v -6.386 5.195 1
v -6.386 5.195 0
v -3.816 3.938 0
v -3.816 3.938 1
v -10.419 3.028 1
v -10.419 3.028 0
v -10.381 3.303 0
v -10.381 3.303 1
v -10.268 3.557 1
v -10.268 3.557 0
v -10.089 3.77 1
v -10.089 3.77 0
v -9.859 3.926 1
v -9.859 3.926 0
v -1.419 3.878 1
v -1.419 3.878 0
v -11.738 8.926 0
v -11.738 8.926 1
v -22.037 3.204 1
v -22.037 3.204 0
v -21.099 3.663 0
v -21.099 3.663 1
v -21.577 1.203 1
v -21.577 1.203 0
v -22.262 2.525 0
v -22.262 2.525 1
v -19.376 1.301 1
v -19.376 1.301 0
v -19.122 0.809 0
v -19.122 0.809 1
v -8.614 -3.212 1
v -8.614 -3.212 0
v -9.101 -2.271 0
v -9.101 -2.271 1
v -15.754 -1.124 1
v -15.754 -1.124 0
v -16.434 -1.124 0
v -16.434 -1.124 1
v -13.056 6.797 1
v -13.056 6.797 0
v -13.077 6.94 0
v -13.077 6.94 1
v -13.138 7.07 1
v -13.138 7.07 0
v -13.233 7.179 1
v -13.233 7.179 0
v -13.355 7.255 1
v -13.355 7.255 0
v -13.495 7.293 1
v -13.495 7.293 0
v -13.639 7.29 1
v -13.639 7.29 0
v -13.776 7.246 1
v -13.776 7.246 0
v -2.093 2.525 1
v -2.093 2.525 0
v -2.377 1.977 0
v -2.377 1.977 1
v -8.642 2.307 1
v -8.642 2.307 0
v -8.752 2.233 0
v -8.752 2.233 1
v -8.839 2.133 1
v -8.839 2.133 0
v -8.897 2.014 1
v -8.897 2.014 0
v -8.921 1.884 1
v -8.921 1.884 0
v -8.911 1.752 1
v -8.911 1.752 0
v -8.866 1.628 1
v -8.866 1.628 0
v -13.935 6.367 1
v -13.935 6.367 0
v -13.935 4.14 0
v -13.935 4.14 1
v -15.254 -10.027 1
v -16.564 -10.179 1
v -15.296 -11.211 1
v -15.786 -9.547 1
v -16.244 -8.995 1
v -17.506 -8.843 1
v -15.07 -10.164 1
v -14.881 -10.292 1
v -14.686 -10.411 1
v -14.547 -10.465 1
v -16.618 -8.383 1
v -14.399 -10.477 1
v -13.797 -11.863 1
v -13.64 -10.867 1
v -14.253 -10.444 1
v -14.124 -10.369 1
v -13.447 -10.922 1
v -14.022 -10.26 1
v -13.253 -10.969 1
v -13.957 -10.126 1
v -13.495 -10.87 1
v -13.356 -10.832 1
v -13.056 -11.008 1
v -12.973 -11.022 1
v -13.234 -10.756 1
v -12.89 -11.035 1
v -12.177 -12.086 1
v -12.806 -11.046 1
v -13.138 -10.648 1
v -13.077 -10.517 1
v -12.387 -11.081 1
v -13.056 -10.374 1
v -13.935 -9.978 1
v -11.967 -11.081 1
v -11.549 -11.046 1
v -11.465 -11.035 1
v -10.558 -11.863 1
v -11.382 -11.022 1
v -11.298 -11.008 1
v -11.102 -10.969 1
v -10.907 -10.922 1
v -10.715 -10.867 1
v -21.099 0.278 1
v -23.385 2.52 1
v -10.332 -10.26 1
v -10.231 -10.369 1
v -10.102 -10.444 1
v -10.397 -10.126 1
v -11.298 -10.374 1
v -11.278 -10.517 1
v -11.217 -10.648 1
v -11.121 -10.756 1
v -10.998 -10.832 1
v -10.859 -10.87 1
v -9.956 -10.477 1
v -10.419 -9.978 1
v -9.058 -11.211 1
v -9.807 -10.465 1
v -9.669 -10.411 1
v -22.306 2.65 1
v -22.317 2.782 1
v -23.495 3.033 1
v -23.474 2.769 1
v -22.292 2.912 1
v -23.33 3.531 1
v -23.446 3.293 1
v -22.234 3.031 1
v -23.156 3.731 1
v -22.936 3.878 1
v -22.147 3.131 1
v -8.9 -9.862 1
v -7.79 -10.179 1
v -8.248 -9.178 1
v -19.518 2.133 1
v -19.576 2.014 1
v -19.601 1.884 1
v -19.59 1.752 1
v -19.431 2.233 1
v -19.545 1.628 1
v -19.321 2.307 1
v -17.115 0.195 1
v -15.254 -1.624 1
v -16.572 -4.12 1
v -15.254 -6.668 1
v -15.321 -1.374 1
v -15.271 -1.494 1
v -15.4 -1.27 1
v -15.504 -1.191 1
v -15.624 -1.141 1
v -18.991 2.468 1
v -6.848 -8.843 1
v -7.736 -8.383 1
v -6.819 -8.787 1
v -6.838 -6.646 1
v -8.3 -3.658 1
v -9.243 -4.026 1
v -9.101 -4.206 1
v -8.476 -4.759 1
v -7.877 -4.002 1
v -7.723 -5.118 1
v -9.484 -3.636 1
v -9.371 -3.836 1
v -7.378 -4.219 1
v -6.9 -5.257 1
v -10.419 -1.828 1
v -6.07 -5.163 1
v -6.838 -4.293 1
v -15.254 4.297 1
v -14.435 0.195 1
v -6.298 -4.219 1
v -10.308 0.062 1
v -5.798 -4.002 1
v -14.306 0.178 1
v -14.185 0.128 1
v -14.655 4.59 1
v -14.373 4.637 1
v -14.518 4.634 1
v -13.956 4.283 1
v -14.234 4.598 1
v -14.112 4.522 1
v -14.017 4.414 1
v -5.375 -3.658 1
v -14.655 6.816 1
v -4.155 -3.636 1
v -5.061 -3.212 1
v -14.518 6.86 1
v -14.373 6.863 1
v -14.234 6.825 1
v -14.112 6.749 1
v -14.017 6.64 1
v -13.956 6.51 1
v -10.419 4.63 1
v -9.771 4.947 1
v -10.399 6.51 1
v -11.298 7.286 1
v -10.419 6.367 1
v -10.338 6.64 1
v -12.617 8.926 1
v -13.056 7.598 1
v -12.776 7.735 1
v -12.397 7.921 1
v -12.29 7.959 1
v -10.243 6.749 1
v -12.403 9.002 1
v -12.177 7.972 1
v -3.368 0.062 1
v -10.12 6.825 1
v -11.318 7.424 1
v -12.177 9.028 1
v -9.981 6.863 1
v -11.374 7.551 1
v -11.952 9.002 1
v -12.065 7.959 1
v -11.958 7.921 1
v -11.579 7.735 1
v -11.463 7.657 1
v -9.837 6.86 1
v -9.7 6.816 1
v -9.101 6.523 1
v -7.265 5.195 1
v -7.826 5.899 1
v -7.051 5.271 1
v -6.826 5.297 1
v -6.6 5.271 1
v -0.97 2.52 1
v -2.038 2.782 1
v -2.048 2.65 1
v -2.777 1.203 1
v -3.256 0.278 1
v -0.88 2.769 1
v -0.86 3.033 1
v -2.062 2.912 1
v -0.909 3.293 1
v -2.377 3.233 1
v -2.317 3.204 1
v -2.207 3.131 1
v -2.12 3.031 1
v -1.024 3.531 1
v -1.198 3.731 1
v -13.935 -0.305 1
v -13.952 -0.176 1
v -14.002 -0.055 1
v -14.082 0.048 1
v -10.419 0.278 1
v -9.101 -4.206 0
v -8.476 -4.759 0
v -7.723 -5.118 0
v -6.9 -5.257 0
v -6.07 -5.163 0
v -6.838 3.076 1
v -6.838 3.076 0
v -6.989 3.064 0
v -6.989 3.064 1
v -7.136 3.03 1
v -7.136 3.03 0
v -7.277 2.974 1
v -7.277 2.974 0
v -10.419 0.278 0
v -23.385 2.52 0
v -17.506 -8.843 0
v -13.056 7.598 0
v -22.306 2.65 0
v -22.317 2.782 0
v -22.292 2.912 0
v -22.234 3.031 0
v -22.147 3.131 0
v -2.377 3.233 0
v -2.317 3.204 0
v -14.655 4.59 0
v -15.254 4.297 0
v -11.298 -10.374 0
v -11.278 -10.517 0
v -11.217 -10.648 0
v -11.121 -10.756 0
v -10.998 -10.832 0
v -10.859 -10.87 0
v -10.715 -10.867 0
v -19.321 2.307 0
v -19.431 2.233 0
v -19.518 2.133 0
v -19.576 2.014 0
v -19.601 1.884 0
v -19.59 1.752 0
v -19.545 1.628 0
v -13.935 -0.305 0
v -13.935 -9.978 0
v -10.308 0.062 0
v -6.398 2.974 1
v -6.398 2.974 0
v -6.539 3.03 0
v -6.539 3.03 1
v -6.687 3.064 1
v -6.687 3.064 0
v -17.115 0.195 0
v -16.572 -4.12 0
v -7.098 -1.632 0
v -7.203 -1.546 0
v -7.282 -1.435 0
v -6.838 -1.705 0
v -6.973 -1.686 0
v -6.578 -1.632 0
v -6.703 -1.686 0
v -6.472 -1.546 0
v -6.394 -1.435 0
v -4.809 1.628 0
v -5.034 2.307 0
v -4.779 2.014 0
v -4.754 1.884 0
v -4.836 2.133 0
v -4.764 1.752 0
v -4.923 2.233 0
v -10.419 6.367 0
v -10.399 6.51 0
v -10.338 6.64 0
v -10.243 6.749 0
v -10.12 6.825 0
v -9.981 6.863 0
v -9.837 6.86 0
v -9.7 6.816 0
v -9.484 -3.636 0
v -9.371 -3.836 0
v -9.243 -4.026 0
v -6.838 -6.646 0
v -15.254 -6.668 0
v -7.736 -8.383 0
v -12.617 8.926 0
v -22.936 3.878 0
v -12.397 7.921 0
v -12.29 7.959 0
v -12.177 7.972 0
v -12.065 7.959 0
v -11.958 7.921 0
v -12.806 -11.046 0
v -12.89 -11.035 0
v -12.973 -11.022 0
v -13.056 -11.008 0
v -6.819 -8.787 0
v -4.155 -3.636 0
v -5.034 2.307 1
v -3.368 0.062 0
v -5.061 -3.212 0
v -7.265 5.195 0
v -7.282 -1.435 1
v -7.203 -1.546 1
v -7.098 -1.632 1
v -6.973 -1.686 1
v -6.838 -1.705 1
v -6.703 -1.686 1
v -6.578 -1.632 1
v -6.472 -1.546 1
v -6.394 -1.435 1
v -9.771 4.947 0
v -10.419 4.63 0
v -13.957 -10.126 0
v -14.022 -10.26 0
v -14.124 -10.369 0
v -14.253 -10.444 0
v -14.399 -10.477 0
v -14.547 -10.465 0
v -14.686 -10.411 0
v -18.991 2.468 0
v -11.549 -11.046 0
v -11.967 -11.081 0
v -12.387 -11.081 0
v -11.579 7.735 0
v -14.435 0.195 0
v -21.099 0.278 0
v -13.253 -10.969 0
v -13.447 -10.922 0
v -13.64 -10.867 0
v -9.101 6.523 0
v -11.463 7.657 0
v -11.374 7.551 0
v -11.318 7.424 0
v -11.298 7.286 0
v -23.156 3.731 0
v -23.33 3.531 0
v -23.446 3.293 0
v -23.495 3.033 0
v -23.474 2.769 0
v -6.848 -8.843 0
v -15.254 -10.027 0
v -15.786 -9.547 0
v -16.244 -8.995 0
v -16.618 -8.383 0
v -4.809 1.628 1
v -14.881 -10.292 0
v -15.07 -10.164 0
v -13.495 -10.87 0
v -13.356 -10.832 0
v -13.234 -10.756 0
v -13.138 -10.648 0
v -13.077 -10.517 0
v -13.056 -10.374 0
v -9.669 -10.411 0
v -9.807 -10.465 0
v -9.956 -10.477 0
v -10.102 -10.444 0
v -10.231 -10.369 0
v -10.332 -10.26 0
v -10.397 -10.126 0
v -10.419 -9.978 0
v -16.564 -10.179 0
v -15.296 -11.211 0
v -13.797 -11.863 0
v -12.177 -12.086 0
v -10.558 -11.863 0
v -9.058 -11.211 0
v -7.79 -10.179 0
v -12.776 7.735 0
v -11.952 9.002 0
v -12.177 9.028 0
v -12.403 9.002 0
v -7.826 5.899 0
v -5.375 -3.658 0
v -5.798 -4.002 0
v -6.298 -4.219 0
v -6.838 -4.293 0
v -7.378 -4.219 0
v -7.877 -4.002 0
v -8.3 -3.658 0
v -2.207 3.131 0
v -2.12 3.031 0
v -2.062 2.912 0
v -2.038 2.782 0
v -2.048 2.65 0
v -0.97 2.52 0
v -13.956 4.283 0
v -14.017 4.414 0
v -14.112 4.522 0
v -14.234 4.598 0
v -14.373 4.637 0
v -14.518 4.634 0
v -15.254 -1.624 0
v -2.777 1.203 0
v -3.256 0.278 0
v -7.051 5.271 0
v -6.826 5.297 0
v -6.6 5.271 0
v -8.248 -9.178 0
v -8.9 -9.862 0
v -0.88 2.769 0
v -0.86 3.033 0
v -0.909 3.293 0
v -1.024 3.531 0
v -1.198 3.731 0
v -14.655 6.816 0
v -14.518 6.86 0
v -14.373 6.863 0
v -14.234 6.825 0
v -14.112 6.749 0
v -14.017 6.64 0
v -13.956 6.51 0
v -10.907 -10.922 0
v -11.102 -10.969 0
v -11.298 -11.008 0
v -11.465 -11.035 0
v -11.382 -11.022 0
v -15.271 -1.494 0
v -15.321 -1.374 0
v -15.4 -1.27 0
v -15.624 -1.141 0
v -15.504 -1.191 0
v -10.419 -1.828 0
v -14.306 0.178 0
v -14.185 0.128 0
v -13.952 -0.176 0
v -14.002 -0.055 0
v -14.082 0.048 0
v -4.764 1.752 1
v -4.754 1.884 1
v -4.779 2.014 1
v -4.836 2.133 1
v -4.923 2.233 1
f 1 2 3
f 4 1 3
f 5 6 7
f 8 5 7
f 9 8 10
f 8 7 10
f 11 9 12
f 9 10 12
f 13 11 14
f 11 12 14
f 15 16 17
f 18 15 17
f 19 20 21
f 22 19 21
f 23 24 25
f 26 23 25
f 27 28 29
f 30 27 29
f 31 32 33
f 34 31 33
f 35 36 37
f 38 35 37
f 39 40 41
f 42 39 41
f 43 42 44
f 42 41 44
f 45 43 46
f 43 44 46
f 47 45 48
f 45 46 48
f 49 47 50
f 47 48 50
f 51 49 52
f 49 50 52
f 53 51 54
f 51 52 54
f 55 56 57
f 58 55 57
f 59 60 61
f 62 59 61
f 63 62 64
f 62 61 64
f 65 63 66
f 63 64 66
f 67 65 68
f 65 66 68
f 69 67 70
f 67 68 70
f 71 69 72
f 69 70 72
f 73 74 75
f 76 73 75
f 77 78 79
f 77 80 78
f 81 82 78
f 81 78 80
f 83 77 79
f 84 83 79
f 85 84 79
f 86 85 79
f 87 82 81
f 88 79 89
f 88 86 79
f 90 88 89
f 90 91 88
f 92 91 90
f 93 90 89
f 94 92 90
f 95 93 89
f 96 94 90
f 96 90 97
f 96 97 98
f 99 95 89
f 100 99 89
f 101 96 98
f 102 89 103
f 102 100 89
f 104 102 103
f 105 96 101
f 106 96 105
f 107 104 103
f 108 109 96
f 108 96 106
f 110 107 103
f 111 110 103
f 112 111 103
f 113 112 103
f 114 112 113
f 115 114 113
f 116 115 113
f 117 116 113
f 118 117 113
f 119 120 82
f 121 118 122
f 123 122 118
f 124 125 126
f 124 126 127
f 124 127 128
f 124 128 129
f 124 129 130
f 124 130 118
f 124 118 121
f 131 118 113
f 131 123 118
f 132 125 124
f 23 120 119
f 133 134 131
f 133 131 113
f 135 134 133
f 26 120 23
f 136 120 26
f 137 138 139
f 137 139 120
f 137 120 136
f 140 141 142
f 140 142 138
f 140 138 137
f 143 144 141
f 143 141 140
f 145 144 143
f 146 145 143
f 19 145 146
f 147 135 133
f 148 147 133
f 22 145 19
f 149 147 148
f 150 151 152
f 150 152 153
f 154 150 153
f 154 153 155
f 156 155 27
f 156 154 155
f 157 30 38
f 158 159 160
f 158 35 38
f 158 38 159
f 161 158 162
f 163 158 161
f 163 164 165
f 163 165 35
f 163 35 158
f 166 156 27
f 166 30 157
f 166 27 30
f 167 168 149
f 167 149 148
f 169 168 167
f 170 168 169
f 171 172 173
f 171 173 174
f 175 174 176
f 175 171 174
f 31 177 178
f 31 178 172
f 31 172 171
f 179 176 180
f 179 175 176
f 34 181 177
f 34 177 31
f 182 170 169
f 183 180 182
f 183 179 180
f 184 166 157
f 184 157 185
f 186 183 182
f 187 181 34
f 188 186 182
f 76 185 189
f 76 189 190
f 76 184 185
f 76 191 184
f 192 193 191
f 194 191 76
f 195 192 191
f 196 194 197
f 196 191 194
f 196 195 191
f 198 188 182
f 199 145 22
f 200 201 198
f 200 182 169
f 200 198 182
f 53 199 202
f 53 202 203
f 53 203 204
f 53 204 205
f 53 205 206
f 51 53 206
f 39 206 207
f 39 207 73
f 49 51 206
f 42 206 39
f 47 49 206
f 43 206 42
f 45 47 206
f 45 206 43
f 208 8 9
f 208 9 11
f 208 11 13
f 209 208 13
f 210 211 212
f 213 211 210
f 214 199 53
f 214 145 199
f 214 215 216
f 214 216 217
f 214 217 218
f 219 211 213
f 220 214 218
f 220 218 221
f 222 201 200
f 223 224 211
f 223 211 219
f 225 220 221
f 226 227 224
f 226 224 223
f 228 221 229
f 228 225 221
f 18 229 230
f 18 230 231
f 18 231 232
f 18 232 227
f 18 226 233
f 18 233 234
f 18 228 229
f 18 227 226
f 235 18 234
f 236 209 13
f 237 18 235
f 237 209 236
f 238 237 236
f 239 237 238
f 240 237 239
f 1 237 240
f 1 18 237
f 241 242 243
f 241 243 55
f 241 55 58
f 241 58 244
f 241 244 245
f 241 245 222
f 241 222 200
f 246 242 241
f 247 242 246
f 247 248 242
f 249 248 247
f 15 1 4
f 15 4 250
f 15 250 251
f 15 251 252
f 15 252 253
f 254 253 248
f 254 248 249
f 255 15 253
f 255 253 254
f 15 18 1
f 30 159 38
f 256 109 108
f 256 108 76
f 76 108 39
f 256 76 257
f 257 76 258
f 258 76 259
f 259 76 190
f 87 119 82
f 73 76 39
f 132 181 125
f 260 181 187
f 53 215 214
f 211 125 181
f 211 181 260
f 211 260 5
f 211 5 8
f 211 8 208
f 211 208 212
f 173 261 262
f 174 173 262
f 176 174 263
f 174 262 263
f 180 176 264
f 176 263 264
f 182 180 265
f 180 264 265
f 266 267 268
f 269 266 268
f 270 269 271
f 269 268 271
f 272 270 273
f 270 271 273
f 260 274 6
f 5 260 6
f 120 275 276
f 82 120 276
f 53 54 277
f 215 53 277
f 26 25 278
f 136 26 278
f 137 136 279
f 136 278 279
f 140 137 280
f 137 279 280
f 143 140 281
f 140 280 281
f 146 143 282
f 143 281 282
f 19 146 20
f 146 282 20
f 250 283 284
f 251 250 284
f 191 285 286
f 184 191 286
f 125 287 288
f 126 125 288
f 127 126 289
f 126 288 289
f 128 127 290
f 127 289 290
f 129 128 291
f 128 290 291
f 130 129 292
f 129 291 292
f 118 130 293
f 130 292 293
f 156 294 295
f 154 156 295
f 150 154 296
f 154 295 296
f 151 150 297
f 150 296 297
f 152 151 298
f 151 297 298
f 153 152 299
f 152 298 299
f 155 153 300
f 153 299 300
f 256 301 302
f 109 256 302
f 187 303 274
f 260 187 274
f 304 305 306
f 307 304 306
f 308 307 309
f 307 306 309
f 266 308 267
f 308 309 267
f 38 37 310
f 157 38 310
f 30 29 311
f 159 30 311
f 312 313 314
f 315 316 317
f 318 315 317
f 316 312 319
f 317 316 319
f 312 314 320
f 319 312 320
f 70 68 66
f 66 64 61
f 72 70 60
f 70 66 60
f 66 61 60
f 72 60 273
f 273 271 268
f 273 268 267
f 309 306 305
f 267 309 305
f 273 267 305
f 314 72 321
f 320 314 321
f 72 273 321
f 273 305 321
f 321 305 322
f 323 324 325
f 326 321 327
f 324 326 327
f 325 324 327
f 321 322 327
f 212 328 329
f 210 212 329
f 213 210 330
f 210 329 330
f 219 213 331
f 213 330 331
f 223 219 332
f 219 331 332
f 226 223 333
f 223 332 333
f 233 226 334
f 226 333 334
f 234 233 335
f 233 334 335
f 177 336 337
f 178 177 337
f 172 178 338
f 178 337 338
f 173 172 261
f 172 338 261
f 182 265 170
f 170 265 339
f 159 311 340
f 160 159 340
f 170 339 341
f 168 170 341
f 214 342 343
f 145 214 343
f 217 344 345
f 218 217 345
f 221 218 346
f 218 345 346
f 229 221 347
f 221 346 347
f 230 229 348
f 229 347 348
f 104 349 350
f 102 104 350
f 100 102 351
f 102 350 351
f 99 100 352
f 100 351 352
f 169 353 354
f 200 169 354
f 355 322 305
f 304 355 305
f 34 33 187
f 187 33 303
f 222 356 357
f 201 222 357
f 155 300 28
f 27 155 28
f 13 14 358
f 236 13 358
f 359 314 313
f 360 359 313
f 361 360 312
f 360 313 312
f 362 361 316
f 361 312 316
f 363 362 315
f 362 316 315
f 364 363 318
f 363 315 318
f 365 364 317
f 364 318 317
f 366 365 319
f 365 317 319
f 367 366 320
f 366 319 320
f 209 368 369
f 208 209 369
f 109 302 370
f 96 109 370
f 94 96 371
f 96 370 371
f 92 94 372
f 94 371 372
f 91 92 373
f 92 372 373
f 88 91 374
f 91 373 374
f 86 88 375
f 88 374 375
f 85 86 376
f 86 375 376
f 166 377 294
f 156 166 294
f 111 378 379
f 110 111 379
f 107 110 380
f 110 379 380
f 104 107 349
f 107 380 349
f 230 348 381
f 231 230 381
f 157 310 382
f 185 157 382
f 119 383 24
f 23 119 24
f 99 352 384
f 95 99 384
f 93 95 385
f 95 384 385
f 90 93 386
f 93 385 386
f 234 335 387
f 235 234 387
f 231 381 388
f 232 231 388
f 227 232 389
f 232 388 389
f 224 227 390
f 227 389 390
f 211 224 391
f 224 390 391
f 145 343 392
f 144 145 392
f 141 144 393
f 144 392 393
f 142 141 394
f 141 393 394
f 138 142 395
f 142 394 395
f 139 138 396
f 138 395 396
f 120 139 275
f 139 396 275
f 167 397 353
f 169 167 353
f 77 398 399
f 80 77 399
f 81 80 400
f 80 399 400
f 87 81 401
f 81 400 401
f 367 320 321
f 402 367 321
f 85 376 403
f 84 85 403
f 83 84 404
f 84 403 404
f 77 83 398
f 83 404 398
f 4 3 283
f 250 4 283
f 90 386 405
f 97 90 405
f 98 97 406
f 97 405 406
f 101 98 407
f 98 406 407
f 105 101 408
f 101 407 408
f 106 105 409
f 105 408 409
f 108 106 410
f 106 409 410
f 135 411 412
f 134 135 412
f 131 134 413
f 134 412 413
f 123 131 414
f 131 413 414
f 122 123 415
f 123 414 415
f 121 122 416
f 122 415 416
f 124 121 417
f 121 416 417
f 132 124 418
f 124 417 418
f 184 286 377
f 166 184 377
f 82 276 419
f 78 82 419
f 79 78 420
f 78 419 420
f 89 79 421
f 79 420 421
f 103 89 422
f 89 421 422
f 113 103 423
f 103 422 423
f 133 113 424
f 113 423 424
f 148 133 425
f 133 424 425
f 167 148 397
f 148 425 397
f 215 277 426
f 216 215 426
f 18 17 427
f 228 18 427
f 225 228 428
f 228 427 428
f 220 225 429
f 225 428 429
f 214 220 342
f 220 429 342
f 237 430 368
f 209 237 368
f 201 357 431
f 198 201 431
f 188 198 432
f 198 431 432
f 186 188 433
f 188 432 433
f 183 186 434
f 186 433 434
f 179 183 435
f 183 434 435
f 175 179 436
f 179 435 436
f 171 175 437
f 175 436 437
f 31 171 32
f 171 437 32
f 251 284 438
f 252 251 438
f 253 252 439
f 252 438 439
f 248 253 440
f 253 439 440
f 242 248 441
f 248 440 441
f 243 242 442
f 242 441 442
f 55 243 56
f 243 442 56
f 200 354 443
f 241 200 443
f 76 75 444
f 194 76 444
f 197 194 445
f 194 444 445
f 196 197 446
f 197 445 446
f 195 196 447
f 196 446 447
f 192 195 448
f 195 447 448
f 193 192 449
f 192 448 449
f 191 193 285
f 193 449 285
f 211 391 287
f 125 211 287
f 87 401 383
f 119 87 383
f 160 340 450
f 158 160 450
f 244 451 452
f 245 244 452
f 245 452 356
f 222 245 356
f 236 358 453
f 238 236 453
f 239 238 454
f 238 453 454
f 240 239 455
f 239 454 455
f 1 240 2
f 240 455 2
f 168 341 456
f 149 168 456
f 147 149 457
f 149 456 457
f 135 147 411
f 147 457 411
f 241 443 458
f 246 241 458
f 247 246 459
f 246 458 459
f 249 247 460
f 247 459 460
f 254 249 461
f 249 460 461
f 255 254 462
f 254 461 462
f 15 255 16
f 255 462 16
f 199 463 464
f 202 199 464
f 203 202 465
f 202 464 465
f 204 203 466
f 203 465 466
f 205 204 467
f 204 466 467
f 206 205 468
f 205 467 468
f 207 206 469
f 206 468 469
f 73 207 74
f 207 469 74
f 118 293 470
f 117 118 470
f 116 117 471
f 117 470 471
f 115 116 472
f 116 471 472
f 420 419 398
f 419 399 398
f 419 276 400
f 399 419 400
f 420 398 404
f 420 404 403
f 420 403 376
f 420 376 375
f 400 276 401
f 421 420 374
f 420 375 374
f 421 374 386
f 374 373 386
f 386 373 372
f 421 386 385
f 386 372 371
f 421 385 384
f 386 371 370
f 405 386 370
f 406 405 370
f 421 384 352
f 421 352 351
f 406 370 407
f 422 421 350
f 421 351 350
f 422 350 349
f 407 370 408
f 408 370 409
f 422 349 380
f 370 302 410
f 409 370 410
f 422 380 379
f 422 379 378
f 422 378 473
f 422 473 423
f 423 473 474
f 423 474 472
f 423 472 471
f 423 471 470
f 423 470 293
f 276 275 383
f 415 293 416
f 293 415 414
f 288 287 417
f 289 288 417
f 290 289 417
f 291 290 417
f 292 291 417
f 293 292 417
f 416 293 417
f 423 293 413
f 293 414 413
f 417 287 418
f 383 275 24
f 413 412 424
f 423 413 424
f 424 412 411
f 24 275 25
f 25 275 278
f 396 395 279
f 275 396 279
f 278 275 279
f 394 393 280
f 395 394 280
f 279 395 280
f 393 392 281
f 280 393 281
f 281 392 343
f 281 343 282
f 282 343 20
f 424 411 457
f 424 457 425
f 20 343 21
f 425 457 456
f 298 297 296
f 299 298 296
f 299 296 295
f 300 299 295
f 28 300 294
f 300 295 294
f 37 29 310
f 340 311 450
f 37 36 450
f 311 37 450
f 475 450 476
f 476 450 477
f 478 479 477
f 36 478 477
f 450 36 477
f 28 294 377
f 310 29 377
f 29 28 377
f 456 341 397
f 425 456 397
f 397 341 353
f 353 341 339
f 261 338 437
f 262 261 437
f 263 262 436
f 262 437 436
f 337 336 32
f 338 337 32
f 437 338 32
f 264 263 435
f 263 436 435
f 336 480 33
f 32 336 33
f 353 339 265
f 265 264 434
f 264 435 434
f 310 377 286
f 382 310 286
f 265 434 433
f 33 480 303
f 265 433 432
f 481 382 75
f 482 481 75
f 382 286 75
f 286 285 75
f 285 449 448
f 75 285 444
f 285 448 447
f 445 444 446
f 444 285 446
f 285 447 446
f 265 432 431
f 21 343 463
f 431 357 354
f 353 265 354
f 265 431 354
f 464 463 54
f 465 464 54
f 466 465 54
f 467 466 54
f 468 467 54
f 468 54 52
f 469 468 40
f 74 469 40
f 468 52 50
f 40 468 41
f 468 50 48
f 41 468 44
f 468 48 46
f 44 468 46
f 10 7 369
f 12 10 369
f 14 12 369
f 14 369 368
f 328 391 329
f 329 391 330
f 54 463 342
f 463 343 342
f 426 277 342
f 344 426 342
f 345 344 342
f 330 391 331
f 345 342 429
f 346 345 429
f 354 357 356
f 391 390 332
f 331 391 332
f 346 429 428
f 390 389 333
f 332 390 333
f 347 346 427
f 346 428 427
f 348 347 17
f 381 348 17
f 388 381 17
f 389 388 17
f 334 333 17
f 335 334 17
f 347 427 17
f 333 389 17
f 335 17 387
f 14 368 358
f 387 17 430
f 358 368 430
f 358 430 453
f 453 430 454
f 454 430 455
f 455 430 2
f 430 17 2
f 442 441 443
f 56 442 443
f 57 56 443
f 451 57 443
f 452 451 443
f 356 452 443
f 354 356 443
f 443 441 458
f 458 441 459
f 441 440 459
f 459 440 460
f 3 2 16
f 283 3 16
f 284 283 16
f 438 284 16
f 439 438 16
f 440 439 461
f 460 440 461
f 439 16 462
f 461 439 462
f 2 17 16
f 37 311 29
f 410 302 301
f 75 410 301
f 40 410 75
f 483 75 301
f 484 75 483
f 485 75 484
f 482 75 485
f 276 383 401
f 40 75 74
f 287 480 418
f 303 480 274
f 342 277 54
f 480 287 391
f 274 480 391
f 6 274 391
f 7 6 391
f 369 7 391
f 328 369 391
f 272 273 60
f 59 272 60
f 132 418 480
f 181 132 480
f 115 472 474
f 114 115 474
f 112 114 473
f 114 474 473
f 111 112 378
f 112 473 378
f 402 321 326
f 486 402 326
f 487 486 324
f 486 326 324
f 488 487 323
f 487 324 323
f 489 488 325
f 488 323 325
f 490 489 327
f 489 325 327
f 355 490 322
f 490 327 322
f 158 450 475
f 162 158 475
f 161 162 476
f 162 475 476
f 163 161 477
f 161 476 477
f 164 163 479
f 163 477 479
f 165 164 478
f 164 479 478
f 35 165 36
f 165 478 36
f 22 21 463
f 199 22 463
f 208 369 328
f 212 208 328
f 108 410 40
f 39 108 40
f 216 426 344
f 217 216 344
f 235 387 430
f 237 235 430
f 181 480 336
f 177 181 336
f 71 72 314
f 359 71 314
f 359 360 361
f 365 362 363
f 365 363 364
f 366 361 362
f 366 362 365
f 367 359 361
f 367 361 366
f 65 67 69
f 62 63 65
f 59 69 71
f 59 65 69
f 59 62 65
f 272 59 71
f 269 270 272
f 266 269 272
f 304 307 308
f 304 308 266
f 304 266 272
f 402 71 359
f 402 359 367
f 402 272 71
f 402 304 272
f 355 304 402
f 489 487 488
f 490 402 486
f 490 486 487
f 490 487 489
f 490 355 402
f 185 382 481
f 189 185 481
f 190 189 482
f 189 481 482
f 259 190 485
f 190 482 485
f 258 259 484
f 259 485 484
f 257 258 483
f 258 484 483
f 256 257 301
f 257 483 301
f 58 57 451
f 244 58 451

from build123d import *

# Parameters (mm, degrees)
F1_DEPTH = 1


# Not quite as in the source:
# - a feature names something its author has since deleted; it is built from what else it names


with BuildPart() as f1:
    # F0 (on Top) → F1 (new body)
    with BuildSketch(Plane.XY):
        with BuildLine():
            ThreePointArc((-11.7378467649, 8.9264858588), (-12.17732, 9.0282301738), (-12.6167932351, 8.9264858588))
            Line((-12.6167932351, 8.9264858588), (-22.9360292278, 3.8777807945))
            ThreePointArc((-22.9360292278, 3.8777807945), (-23.4460487393, 3.2933140895), (-23.3847383062, 2.5200338931))
            Line((-23.3847383062, 2.5200338931), (-17.5064138811, -8.8425854586))
            ThreePointArc((-17.5064138811, -8.8425854586), (-12.17732, -12.0856381601), (-6.8482261189, -8.8425854586))
            Line((-6.8482261189, -8.8425854586), (-6.8193229677, -8.786716561))
            Line((-6.8193229677, -8.786716561), (-4.1547760271, -3.6362297146))
            Line((-4.1547760271, -3.6362297146), (-0.9699016938, 2.5200338931))
            ThreePointArc((-0.9699016938, 2.5200338931), (-0.9085912607, 3.2933140895), (-1.4186107722, 3.8777807945))
            Line((-1.4186107722, 3.8777807945), (-11.7378467649, 8.9264858588))
        make_face()
        with BuildLine():
            ThreePointArc((-13.9352129405, -9.9781848161), (-14.1856518225, -10.4114506102), (-14.6860899339, -10.4106900001))
            ThreePointArc((-14.6860899339, -10.4106900001), (-14.9764347702, -10.2286994079), (-15.253632646, -10.0272495698))
            ThreePointArc((-15.253632646, -10.0272495698), (-16.0247836651, -9.2789159973), (-16.6182315676, -8.3830942422))
            Line((-16.6182315676, -8.3830942422), (-21.0987998739, 0.2777057515))
            Line((-21.0987998739, 0.2777057515), (-21.5773427489, 1.202714332))
            Line((-21.5773427489, 1.202714332), (-22.2616031934, 2.5253686134))
            ThreePointArc((-22.2616031934, 2.5253686134), (-22.29225841, 2.9120087116), (-22.0372486542, 3.2042420641))
            Line((-22.0372486542, 3.2042420641), (-21.0987998739, 3.6633798445))
            Line((-21.0987998739, 3.6633798445), (-14.6549495581, 6.8160453855))
            ThreePointArc((-14.6549495581, 6.8160453855), (-14.1705134022, 6.7911040048), (-13.9352129405, 6.366917543))
            Line((-13.9352129405, 6.366917543), (-13.9352129405, 4.1403800065))
            ThreePointArc((-13.9352129405, 4.1403800065), (-14.1705134022, 4.5645664683), (-14.6549495581, 4.589507849))
            Line((-14.6549495581, 4.589507849), (-15.253632646, 4.2966010544))
            Line((-15.253632646, 4.2966010544), (-18.9906600384, 2.4682535744))
            Line((-18.9906600384, 2.4682535744), (-18.5866887981, 1.687389658))
            Line((-18.5866887981, 1.687389658), (-16.9010777379, 2.5120779491))
            Line((-16.9010777379, 2.5120779491), (-14.6549495581, 3.6110002651))
            ThreePointArc((-14.6549495581, 3.6110002651), (-14.1705134022, 3.5860588844), (-13.9352129405, 3.1618724226))
            Line((-13.9352129405, 3.1618724226), (-13.9352129405, 1.0737917123))
            Line((-13.9352129405, 1.0737917123), (-13.9352129405, -0.3051582877))
            Line((-13.9352129405, -0.3051582877), (-13.9352129405, -9.9781848161))
        make_face(mode=Mode.SUBTRACT)
        with BuildLine():
            Line((-10.6659804544, -10.8341303593), (-10.4194270595, -10.7664300173))
            ThreePointArc((-10.4194270595, -10.7664300173), (-10.5663720437, -10.8190139832), (-10.7148866004, -10.8669861449))
            ThreePointArc((-10.7148866004, -10.8669861449), (-11.0045154737, -10.9461452883), (-11.2983735297, -11.0077772381))
            ThreePointArc((-11.2983735297, -11.0077772381), (-11.423285282, -11.0284543254), (-11.548680536, -11.0459619827))
            ThreePointArc((-11.548680536, -11.0459619827), (-11.6318465406, -11.0842260567), (-11.720595012, -11.1066856319))
            ThreePointArc((-11.720595012, -11.1066856319), (-12.17732, -11.1424265632), (-12.634044988, -11.1066856319))
            ThreePointArc((-12.634044988, -11.1066856319), (-12.7227934594, -11.0842260567), (-12.805959464, -11.0459619827))
            ThreePointArc((-12.805959464, -11.0459619827), (-12.931354718, -11.0284543254), (-13.0562664703, -11.0077772381))
            ThreePointArc((-13.0562664703, -11.0077772381), (-13.3501245263, -10.9461452883), (-13.6397533997, -10.8669861449))
            ThreePointArc((-13.6397533997, -10.8669861449), (-13.2335773511, -10.7559370641), (-13.0562664703, -10.3740054834))
            Line((-13.0562664703, -10.3740054834), (-13.0562664703, -10.0437429667))
            Line((-13.0562664703, -10.0437429667), (-13.0562664703, 5.3716664708))
            Line((-13.0562664703, 5.3716664708), (-13.0562664703, 6.7969437096))
            ThreePointArc((-13.0562664703, 6.7969437096), (-13.2915669319, 7.2211301714), (-13.7760030878, 7.246071552))
            Line((-13.7760030878, 7.246071552), (-13.0562664703, 7.5982040073))
            Line((-13.0562664703, 7.5982040073), (-12.7760030878, 7.7353233792))
            Line((-12.7760030878, 7.7353233792), (-12.3970566176, 7.9207236322))
            ThreePointArc((-12.3970566176, 7.9207236322), (-12.17732, 7.9715957897), (-11.9575833824, 7.9207236322))
            Line((-11.9575833824, 7.9207236322), (-11.5786369122, 7.7353233792))
            ThreePointArc((-11.5786369122, 7.7353233792), (-11.3741870679, 7.5508950751), (-11.2983735297, 7.2861955367))
            Line((-11.2983735297, 7.2861955367), (-11.2983735297, -10.0437429667))
            Line((-11.2983735297, -10.0437429667), (-11.2983735297, -10.3519767804))
            ThreePointArc((-11.2983735297, -10.3519767804), (-11.1015265128, -10.7495925105), (-10.6659804544, -10.8341303593))
        make_face(mode=Mode.SUBTRACT)
        with BuildLine():
            Line((-5.5053601225, -4.0705468447), (-6.0704119356, -5.1627745276))
            Line((-6.0704119356, -5.1627745276), (-6.8376335928, -6.6457902679))
            Line((-6.8376335928, -6.6457902679), (-7.7364084324, -8.3830942422))
            ThreePointArc((-7.7364084324, -8.3830942422), (-8.5576094615, -9.5349418025), (-9.6685500661, -10.4106900001))
            ThreePointArc((-9.6685500661, -10.4106900001), (-10.1689881775, -10.4114506102), (-10.4194270595, -9.9781848161))
            Line((-10.4194270595, -9.9781848161), (-10.4194270595, -1.8278266693))
            Line((-10.4194270595, -1.8278266693), (-10.4194270595, -0.3051582877))
            Line((-10.4194270595, -0.3051582877), (-10.4194270595, 0.2777057515))
            Line((-10.4194270595, 0.2777057515), (-10.4194270595, 0.5210568374))
            Line((-10.4194270595, 0.5210568374), (-10.4194270595, 3.0275448634))
            Line((-10.4194270595, 3.0275448634), (-10.4194270595, 4.6300693884))
            Line((-10.4194270595, 4.6300693884), (-10.4194270595, 6.366917543))
            Line((-10.4194270595, 6.366917543), (-10.4194270595, 7.1681778407))
            Line((-10.4194270595, 7.1681778407), (-9.6996904419, 6.8160453855))
            Line((-9.6996904419, 6.8160453855), (-9.101007354, 6.5231385909))
            Line((-9.101007354, 6.5231385909), (-7.825559943, 5.8991236145))
            Line((-7.825559943, 5.8991236145), (-6.386082692, 5.1948567393))
            Line((-6.386082692, 5.1948567393), (-3.816366891, 3.9376185884))
            Line((-3.816366891, 3.9376185884), (-2.3768901261, 3.2333519511))
            Line((-2.3768901261, 3.2333519511), (-2.3173913458, 3.2042420641))
            ThreePointArc((-2.3173913458, 3.2042420641), (-2.06238159, 2.9120087116), (-2.0930368066, 2.5253686134))
            Line((-2.0930368066, 2.5253686134), (-2.3768901261, 1.9766889238))
            Line((-2.3768901261, 1.9766889238), (-2.7772972511, 1.202714332))
            Line((-2.7772972511, 1.202714332), (-3.2558401261, 0.2777057515))
            Line((-3.2558401261, 0.2777057515), (-3.3676578126, 0.061565621))
            Line((-3.3676578126, 0.061565621), (-5.0612689658, -3.2121323703))
            Line((-5.0612689658, -3.2121323703), (-5.5053601225, -4.0705468447))
        make_face(mode=Mode.SUBTRACT)
        with BuildLine():
            Line((-16.5720523514, -4.1197169088), (-15.2536327446, -6.6681812422))
            Line((-15.2536327446, -6.6681812422), (-15.2536328928, -1.623578273))
            ThreePointArc((-15.2536328928, -1.623578273), (-15.4000795074, -1.2700248919), (-15.7536328928, -1.1235782877))
            Line((-15.7536328928, -1.1235782877), (-16.0720525039, -1.1235782877))
            Line((-16.0720525039, -1.1235782877), (-16.4336040792, -1.1235782877))
            Line((-16.4336040792, -1.1235782877), (-17.1154396337, 0.1948417123))
            Line((-17.1154396337, 0.1948417123), (-16.0720524345, 0.1948417123))
            Line((-16.0720524345, 0.1948417123), (-15.2536329075, 0.1948417123))
            Line((-15.2536329075, 0.1948417123), (-14.4352129405, 0.1948417123))
            ThreePointArc((-14.4352129405, 0.1948417123), (-14.08165955, 0.0483951029), (-13.9352129405, -0.3051582877))
            Line((-13.9352129405, -0.3051582877), (-13.9352129405, 1.0737917123))
            Line((-13.9352129405, 1.0737917123), (-15.2536329075, 1.0737917123))
            Line((-15.2536329075, 1.0737917123), (-18.2692507427, 1.0737917123))
            Line((-18.2692507427, 1.0737917123), (-18.6097401643, 1.0737917123))
            Line((-18.6097401643, 1.0737917123), (-19.1218068604, 0.8088797168))
            Line((-19.1218068604, 0.8088797168), (-16.5720523514, -4.1197169088))
        make_face()
        Polygon((-16.1325828631, -3.0563212317), (-16.6777508926, -2.0025282877), (-16.1325828631, -2.0025282877), (-16.1325828631, -2.6348403451), align=None, mode=Mode.SUBTRACT)
        with BuildLine():
            Line((-15.2536329075, 1.0737917123), (-13.9352129405, 1.0737917123))
            Line((-13.9352129405, 1.0737917123), (-13.9352129405, 3.1618724226))
            ThreePointArc((-13.9352129405, 3.1618724226), (-14.1705134022, 3.5860588844), (-14.6549495581, 3.6110002651))
            Line((-14.6549495581, 3.6110002651), (-16.9010777379, 2.5120779491))
            Line((-16.9010777379, 2.5120779491), (-18.5866887981, 1.687389658))
            Line((-18.5866887981, 1.687389658), (-18.3411390159, 1.2127495215))
            Line((-18.3411390159, 1.2127495215), (-18.2692507427, 1.0737917123))
            Line((-18.2692507427, 1.0737917123), (-15.2536329075, 1.0737917123))
        make_face()
        with BuildLine():
            ThreePointArc((-9.101007354, -4.2055538888), (-7.7228805899, -5.1184524182), (-6.0704119356, -5.1627745276))
            Line((-6.0704119356, -5.1627745276), (-5.5053601225, -4.0705468447))
            Line((-5.5053601225, -4.0705468447), (-5.0612689658, -3.2121323703))
            ThreePointArc((-5.0612689658, -3.2121323703), (-6.8376335928, -4.2931499375), (-8.6139982198, -3.2121323703))
            Line((-8.6139982198, -3.2121323703), (-9.101007354, -2.2707587726))
            Line((-9.101007354, -2.2707587726), (-9.101007354, -4.2055538888))
        make_face()
        with BuildLine():
            Line((-10.4194270595, 4.6300693884), (-10.4194270595, 3.0275448634))
            ThreePointArc((-10.4194270595, 3.0275448634), (-10.2677999831, 3.5569439401), (-9.8589002946, 3.9258005484))
            Line((-9.8589002946, 3.9258005484), (-7.2650291622, 5.1948567393))
            ThreePointArc((-7.2650291622, 5.1948567393), (-6.8255559271, 5.2966010544), (-6.386082692, 5.1948567393))
            Line((-6.386082692, 5.1948567393), (-7.825559943, 5.8991236145))
            Line((-7.825559943, 5.8991236145), (-9.7711979643, 4.9472166576))
            Line((-9.7711979643, 4.9472166576), (-10.4194270595, 4.6300693884))
        make_face()
        with BuildLine():
            ThreePointArc((-9.4838699082, -3.6362297146), (-9.3087674014, -3.9318726716), (-9.101007354, -4.2055538888))
            Line((-9.101007354, -4.2055538888), (-9.101007354, -2.2707587726))
            Line((-9.101007354, -2.2707587726), (-10.307609373, 0.061565621))
            Line((-10.307609373, 0.061565621), (-10.4194270595, 0.2777057515))
            Line((-10.4194270595, 0.2777057515), (-10.4194270595, -0.3051582877))
            Line((-10.4194270595, -0.3051582877), (-10.4194270595, -1.8278266693))
            Line((-10.4194270595, -1.8278266693), (-9.4838699082, -3.6362297146))
        make_face()
        with BuildLine():
            Line((-19.5454273692, 1.6277250617), (-19.3764089282, 1.3010176414))
            Line((-19.3764089282, 1.3010176414), (-18.5866887981, 1.687389658))
            Line((-18.5866887981, 1.687389658), (-18.9906600384, 2.4682535744))
            Line((-18.9906600384, 2.4682535744), (-19.32107283, 2.3065985124))
            ThreePointArc((-19.32107283, 2.3065985124), (-19.5760825858, 2.01436516), (-19.5454273692, 1.6277250617))
        make_face()
        Polygon((-19.3764089282, 1.3010176414), (-19.1218068604, 0.8088797168), (-18.6097401643, 1.0737917123), (-18.3411390159, 1.2127495215), (-18.5866887981, 1.687389658), align=None)
        Polygon((-16.1325828631, -2.0025282877), (-16.6777508926, -2.0025282877), (-16.1325828631, -3.0563212317), (-16.1325828631, -2.6348403451), align=None)
        with BuildLine():
            Line((-10.4194270595, 7.1681778407), (-10.4194270595, 6.366917543))
            ThreePointArc((-10.4194270595, 6.366917543), (-10.1841265978, 6.7911040048), (-9.6996904419, 6.8160453855))
            Line((-9.6996904419, 6.8160453855), (-10.4194270595, 7.1681778407))
        make_face()
        with BuildLine():
            ThreePointArc((-11.720595012, -11.1066856319), (-11.6318465406, -11.0842260567), (-11.548680536, -11.0459619827))
            ThreePointArc((-11.548680536, -11.0459619827), (-12.17732, -11.0856381601), (-12.805959464, -11.0459619827))
            ThreePointArc((-12.805959464, -11.0459619827), (-12.7227934594, -11.0842260567), (-12.634044988, -11.1066856319))
            ThreePointArc((-12.634044988, -11.1066856319), (-12.17732, -11.1424265632), (-11.720595012, -11.1066856319))
        make_face()
        Polygon((-18.3411390159, 1.2127495215), (-18.6097401643, 1.0737917123), (-18.2692507427, 1.0737917123), align=None)
        with BuildLine():
            ThreePointArc((-10.7148866004, -10.8669861449), (-10.5663720437, -10.8190139832), (-10.4194270595, -10.7664300173))
            Line((-10.4194270595, -10.7664300173), (-10.6659804544, -10.8341303593))
            ThreePointArc((-10.6659804544, -10.8341303593), (-11.1015265128, -10.7495925105), (-11.2983735297, -10.3519767804))
            Line((-11.2983735297, -10.3519767804), (-11.2983735297, -10.3740054834))
            ThreePointArc((-11.2983735297, -10.3740054834), (-11.1210626489, -10.7559370641), (-10.7148866004, -10.8669861449))
        make_face()
    extrude(amount=F1_DEPTH)


with BuildPart() as f1b:
    # F0 (on Top) → F1, piece 2 (new body)
    with BuildSketch(Plane.XY):
        with BuildLine():
            ThreePointArc((-7.2817247495, -1.4347354631), (-6.8376335928, -1.7049898549), (-6.393542436, -1.4347354631))
            Line((-6.393542436, -1.4347354631), (-4.8092126308, 1.6277250617))
            ThreePointArc((-4.8092126308, 1.6277250617), (-4.7785574142, 2.01436516), (-5.03356717, 2.3065985124))
            Line((-5.03356717, 2.3065985124), (-6.3981603577, 2.9742282228))
            ThreePointArc((-6.3981603577, 2.9742282228), (-6.6120850226, 3.0502044622), (-6.8376335928, 3.0759725378))
            ThreePointArc((-6.8376335928, 3.0759725378), (-7.063182163, 3.0502044622), (-7.2771068279, 2.9742282228))
            Line((-7.2771068279, 2.9742282228), (-8.6417000156, 2.3065985124))
            ThreePointArc((-8.6417000156, 2.3065985124), (-8.8967097713, 2.01436516), (-8.8660545548, 1.6277250617))
            Line((-8.8660545548, 1.6277250617), (-7.2817247495, -1.4347354631))
        make_face()
        Polygon((-6.8581561948, 2.2207744428), (-6.8376335928, 2.2107337222), (-5.7679512019, 1.687389658), (-6.8376335928, -0.3802733283), (-7.9034853086, 1.6799850815), align=None, mode=Mode.SUBTRACT)
        Polygon((-5.7679512019, 1.687389658), (-6.8376335928, 2.2107337222), (-6.8581561948, 2.2207744428), (-7.9034853086, 1.6799850815), (-6.8376335928, -0.3802733283), align=None)
    extrude(amount=F1_DEPTH)


solid = Compound([f1.part, f1b.part])
